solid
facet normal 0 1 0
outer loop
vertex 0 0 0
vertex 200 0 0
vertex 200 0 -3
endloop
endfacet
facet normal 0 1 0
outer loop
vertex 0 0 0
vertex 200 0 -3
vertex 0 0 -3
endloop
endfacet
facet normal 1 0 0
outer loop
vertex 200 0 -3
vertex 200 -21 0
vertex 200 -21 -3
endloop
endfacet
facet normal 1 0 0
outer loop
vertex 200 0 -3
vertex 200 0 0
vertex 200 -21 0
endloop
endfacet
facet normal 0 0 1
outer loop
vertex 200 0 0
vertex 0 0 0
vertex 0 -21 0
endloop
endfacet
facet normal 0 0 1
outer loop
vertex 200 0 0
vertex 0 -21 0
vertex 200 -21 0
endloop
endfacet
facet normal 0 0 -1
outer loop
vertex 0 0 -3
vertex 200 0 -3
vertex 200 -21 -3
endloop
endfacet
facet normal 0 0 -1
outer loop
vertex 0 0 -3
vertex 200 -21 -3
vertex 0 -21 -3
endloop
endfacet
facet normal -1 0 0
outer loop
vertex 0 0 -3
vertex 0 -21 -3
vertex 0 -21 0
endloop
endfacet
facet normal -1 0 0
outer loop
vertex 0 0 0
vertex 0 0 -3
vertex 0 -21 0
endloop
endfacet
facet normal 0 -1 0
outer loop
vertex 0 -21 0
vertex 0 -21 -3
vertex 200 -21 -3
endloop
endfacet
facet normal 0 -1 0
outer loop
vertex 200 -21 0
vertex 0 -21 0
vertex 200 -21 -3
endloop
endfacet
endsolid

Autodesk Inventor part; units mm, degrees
ref_plane "YZ Plane" through (0, 0, 0) normal (1, 0, 0) x (0, 1, 0)
ref_plane "XZ Plane" through (0, 0, 0) normal (0, 1, 0) x (-1, 0, 0)
ref_plane "XY Plane" through (0, 0, 0) normal (0, 0, 1) x (1, 0, 0)
sketch "block" plane through (0, 0, 0) normal (0, 1, 0) x (-1, 0, 0)
  line L0 (0, 0) -> (-200, 0)
  line L1 (-200, 0) -> (-200, -250)
  line L2 (-200, -250) -> (0, -250)
  line L3 (0, -250) -> (0, 0)
  dimension "d31" = 200
  dimension "d32" = 250
extrude "ext_block" add sketch "block" against normal blind 24
shell "Shell2" thickness 3 removed faces 0
sketch "lines_base" plane through (0, 0, 0) normal (0, 1, 0) x (-1, 0, 0)
  line L0 (0, 0) -> (-200, 0)
  line L1 (-200, 0) -> (-200, -250)
  line L2 (-200, -250) -> (0, -250)
  line L3 (0, -250) -> (0, 0)
  circle A0 centre (-65, -60) radius 6
  circle A1 centre (-125, -80) radius 6
  circle A2 centre (-65, -60) radius 12.5
  circle A3 centre (-65, -60) radius 8.5
  circle A4 centre (-125, -80) radius 8.5
  circle A5 centre (-125, -80) radius 12.5
  circle A6 centre (-175, -125) radius 3
  line L4 (-175, -125) -> (-175, -209)
  line L5 (-175, -125) -> (-91, -125) construction
  circle A7 centre (-175, -139) radius 3
  circle A8 centre (-175, -153) radius 3
  circle A9 centre (-175, -167) radius 3
  circle A10 centre (-175, -181) radius 3
  circle A11 centre (-175, -195) radius 3
  circle A12 centre (-175, -209) radius 3
  circle A13 centre (-95, -185) radius 2.5
  circle A14 centre (-95, -185) radius 5
  point P0 (-200, -125)
  dimension "d0" = 200
  dimension "d1" = 250
  dimension "d2" = 12
  dimension "d3" = 12
  dimension "d4" = 25
  dimension "d5" = 17
  dimension "d6" = 17
  dimension "d7" = 25
  dimension "d8" = 75
  dimension "d9" = 80
  dimension "d10" = 65
  dimension "d11" = 60
  dimension "d12" = 6
  dimension "d13" = 84
  dimension "d14" = 90
  dimension "d15" = 25
  dimension "d16" = 125
  dimension "d19" = 14
  dimension "d24" = 5
  dimension "d25" = 10
  dimension "d26" = 65
  dimension "d27" = 95
extrude "holes" cut sketch "lines_base" against normal up to surface (3 mm away) contours A0 | A1 | A6 | A7 L4 | L4 A7 | A8 L4 | L4 A8 | A9 L4 | L4 A9 | A10 L4 | L4 A10 | A11 L4 | L4 A11 | A12 | A13
sketch "Sketch4" plane through (200, 0, -250) normal (0, 0, -1) x (-1, 0, 0)
  line L0 (188, -4) -> (169, -4)
  line L1 (169, -4) -> (169, -17)
  line L2 (169, -17) -> (188, -17)
  line L3 (188, -17) -> (188, -4)
  line L4 (0, 0) -> (200, 0) projected
  line L5 (200, 0) -> (200, -24) projected
  dimension "d40" = 19
  dimension "d41" = 13
  dimension "d42" = 4
  dimension "d43" = 12
extrude "pwr_button_hole" cut sketch "Sketch4" against normal up to surface (3 mm away)
ref_plane "Work Plane1" through (7, -21, -243) normal (0, 1, 0) x (1, 0, 0)
sketch "Sketch5" plane through (7, -21, -243) normal (0, 1, 0) x (1, 0, 0)
  line L0 (-20.9366, 21.7948) -> (229.9216, 21.7948)
  line L1 (229.9216, 21.7948) -> (229.9216, -260.9184)
  line L2 (229.9216, -260.9184) -> (-20.9366, -260.9184)
  line L3 (-20.9366, -260.9184) -> (-20.9366, 21.7948)
  point P0 (-7, -243)
extrude "back_cover_cut" cut sketch "Sketch5" against normal through all
sketch "Sketch8" plane through (197, -3, -3) normal (0, 0, -1) x (-1, 0, 0)
  line L0 (-20.5673, 18.4526) -> (237.6144, 18.4526)
  line L1 (237.6144, 18.4526) -> (237.6144, -33.7854)
  line L2 (237.6144, -33.7854) -> (-20.5673, -33.7854)
  line L3 (-20.5673, -33.7854) -> (-20.5673, 18.4526)
  point P0 (197, 3)
extrude "Extrusion8" cut sketch "Sketch8" along normal through all
properties part number "side_left" material "Glass"
